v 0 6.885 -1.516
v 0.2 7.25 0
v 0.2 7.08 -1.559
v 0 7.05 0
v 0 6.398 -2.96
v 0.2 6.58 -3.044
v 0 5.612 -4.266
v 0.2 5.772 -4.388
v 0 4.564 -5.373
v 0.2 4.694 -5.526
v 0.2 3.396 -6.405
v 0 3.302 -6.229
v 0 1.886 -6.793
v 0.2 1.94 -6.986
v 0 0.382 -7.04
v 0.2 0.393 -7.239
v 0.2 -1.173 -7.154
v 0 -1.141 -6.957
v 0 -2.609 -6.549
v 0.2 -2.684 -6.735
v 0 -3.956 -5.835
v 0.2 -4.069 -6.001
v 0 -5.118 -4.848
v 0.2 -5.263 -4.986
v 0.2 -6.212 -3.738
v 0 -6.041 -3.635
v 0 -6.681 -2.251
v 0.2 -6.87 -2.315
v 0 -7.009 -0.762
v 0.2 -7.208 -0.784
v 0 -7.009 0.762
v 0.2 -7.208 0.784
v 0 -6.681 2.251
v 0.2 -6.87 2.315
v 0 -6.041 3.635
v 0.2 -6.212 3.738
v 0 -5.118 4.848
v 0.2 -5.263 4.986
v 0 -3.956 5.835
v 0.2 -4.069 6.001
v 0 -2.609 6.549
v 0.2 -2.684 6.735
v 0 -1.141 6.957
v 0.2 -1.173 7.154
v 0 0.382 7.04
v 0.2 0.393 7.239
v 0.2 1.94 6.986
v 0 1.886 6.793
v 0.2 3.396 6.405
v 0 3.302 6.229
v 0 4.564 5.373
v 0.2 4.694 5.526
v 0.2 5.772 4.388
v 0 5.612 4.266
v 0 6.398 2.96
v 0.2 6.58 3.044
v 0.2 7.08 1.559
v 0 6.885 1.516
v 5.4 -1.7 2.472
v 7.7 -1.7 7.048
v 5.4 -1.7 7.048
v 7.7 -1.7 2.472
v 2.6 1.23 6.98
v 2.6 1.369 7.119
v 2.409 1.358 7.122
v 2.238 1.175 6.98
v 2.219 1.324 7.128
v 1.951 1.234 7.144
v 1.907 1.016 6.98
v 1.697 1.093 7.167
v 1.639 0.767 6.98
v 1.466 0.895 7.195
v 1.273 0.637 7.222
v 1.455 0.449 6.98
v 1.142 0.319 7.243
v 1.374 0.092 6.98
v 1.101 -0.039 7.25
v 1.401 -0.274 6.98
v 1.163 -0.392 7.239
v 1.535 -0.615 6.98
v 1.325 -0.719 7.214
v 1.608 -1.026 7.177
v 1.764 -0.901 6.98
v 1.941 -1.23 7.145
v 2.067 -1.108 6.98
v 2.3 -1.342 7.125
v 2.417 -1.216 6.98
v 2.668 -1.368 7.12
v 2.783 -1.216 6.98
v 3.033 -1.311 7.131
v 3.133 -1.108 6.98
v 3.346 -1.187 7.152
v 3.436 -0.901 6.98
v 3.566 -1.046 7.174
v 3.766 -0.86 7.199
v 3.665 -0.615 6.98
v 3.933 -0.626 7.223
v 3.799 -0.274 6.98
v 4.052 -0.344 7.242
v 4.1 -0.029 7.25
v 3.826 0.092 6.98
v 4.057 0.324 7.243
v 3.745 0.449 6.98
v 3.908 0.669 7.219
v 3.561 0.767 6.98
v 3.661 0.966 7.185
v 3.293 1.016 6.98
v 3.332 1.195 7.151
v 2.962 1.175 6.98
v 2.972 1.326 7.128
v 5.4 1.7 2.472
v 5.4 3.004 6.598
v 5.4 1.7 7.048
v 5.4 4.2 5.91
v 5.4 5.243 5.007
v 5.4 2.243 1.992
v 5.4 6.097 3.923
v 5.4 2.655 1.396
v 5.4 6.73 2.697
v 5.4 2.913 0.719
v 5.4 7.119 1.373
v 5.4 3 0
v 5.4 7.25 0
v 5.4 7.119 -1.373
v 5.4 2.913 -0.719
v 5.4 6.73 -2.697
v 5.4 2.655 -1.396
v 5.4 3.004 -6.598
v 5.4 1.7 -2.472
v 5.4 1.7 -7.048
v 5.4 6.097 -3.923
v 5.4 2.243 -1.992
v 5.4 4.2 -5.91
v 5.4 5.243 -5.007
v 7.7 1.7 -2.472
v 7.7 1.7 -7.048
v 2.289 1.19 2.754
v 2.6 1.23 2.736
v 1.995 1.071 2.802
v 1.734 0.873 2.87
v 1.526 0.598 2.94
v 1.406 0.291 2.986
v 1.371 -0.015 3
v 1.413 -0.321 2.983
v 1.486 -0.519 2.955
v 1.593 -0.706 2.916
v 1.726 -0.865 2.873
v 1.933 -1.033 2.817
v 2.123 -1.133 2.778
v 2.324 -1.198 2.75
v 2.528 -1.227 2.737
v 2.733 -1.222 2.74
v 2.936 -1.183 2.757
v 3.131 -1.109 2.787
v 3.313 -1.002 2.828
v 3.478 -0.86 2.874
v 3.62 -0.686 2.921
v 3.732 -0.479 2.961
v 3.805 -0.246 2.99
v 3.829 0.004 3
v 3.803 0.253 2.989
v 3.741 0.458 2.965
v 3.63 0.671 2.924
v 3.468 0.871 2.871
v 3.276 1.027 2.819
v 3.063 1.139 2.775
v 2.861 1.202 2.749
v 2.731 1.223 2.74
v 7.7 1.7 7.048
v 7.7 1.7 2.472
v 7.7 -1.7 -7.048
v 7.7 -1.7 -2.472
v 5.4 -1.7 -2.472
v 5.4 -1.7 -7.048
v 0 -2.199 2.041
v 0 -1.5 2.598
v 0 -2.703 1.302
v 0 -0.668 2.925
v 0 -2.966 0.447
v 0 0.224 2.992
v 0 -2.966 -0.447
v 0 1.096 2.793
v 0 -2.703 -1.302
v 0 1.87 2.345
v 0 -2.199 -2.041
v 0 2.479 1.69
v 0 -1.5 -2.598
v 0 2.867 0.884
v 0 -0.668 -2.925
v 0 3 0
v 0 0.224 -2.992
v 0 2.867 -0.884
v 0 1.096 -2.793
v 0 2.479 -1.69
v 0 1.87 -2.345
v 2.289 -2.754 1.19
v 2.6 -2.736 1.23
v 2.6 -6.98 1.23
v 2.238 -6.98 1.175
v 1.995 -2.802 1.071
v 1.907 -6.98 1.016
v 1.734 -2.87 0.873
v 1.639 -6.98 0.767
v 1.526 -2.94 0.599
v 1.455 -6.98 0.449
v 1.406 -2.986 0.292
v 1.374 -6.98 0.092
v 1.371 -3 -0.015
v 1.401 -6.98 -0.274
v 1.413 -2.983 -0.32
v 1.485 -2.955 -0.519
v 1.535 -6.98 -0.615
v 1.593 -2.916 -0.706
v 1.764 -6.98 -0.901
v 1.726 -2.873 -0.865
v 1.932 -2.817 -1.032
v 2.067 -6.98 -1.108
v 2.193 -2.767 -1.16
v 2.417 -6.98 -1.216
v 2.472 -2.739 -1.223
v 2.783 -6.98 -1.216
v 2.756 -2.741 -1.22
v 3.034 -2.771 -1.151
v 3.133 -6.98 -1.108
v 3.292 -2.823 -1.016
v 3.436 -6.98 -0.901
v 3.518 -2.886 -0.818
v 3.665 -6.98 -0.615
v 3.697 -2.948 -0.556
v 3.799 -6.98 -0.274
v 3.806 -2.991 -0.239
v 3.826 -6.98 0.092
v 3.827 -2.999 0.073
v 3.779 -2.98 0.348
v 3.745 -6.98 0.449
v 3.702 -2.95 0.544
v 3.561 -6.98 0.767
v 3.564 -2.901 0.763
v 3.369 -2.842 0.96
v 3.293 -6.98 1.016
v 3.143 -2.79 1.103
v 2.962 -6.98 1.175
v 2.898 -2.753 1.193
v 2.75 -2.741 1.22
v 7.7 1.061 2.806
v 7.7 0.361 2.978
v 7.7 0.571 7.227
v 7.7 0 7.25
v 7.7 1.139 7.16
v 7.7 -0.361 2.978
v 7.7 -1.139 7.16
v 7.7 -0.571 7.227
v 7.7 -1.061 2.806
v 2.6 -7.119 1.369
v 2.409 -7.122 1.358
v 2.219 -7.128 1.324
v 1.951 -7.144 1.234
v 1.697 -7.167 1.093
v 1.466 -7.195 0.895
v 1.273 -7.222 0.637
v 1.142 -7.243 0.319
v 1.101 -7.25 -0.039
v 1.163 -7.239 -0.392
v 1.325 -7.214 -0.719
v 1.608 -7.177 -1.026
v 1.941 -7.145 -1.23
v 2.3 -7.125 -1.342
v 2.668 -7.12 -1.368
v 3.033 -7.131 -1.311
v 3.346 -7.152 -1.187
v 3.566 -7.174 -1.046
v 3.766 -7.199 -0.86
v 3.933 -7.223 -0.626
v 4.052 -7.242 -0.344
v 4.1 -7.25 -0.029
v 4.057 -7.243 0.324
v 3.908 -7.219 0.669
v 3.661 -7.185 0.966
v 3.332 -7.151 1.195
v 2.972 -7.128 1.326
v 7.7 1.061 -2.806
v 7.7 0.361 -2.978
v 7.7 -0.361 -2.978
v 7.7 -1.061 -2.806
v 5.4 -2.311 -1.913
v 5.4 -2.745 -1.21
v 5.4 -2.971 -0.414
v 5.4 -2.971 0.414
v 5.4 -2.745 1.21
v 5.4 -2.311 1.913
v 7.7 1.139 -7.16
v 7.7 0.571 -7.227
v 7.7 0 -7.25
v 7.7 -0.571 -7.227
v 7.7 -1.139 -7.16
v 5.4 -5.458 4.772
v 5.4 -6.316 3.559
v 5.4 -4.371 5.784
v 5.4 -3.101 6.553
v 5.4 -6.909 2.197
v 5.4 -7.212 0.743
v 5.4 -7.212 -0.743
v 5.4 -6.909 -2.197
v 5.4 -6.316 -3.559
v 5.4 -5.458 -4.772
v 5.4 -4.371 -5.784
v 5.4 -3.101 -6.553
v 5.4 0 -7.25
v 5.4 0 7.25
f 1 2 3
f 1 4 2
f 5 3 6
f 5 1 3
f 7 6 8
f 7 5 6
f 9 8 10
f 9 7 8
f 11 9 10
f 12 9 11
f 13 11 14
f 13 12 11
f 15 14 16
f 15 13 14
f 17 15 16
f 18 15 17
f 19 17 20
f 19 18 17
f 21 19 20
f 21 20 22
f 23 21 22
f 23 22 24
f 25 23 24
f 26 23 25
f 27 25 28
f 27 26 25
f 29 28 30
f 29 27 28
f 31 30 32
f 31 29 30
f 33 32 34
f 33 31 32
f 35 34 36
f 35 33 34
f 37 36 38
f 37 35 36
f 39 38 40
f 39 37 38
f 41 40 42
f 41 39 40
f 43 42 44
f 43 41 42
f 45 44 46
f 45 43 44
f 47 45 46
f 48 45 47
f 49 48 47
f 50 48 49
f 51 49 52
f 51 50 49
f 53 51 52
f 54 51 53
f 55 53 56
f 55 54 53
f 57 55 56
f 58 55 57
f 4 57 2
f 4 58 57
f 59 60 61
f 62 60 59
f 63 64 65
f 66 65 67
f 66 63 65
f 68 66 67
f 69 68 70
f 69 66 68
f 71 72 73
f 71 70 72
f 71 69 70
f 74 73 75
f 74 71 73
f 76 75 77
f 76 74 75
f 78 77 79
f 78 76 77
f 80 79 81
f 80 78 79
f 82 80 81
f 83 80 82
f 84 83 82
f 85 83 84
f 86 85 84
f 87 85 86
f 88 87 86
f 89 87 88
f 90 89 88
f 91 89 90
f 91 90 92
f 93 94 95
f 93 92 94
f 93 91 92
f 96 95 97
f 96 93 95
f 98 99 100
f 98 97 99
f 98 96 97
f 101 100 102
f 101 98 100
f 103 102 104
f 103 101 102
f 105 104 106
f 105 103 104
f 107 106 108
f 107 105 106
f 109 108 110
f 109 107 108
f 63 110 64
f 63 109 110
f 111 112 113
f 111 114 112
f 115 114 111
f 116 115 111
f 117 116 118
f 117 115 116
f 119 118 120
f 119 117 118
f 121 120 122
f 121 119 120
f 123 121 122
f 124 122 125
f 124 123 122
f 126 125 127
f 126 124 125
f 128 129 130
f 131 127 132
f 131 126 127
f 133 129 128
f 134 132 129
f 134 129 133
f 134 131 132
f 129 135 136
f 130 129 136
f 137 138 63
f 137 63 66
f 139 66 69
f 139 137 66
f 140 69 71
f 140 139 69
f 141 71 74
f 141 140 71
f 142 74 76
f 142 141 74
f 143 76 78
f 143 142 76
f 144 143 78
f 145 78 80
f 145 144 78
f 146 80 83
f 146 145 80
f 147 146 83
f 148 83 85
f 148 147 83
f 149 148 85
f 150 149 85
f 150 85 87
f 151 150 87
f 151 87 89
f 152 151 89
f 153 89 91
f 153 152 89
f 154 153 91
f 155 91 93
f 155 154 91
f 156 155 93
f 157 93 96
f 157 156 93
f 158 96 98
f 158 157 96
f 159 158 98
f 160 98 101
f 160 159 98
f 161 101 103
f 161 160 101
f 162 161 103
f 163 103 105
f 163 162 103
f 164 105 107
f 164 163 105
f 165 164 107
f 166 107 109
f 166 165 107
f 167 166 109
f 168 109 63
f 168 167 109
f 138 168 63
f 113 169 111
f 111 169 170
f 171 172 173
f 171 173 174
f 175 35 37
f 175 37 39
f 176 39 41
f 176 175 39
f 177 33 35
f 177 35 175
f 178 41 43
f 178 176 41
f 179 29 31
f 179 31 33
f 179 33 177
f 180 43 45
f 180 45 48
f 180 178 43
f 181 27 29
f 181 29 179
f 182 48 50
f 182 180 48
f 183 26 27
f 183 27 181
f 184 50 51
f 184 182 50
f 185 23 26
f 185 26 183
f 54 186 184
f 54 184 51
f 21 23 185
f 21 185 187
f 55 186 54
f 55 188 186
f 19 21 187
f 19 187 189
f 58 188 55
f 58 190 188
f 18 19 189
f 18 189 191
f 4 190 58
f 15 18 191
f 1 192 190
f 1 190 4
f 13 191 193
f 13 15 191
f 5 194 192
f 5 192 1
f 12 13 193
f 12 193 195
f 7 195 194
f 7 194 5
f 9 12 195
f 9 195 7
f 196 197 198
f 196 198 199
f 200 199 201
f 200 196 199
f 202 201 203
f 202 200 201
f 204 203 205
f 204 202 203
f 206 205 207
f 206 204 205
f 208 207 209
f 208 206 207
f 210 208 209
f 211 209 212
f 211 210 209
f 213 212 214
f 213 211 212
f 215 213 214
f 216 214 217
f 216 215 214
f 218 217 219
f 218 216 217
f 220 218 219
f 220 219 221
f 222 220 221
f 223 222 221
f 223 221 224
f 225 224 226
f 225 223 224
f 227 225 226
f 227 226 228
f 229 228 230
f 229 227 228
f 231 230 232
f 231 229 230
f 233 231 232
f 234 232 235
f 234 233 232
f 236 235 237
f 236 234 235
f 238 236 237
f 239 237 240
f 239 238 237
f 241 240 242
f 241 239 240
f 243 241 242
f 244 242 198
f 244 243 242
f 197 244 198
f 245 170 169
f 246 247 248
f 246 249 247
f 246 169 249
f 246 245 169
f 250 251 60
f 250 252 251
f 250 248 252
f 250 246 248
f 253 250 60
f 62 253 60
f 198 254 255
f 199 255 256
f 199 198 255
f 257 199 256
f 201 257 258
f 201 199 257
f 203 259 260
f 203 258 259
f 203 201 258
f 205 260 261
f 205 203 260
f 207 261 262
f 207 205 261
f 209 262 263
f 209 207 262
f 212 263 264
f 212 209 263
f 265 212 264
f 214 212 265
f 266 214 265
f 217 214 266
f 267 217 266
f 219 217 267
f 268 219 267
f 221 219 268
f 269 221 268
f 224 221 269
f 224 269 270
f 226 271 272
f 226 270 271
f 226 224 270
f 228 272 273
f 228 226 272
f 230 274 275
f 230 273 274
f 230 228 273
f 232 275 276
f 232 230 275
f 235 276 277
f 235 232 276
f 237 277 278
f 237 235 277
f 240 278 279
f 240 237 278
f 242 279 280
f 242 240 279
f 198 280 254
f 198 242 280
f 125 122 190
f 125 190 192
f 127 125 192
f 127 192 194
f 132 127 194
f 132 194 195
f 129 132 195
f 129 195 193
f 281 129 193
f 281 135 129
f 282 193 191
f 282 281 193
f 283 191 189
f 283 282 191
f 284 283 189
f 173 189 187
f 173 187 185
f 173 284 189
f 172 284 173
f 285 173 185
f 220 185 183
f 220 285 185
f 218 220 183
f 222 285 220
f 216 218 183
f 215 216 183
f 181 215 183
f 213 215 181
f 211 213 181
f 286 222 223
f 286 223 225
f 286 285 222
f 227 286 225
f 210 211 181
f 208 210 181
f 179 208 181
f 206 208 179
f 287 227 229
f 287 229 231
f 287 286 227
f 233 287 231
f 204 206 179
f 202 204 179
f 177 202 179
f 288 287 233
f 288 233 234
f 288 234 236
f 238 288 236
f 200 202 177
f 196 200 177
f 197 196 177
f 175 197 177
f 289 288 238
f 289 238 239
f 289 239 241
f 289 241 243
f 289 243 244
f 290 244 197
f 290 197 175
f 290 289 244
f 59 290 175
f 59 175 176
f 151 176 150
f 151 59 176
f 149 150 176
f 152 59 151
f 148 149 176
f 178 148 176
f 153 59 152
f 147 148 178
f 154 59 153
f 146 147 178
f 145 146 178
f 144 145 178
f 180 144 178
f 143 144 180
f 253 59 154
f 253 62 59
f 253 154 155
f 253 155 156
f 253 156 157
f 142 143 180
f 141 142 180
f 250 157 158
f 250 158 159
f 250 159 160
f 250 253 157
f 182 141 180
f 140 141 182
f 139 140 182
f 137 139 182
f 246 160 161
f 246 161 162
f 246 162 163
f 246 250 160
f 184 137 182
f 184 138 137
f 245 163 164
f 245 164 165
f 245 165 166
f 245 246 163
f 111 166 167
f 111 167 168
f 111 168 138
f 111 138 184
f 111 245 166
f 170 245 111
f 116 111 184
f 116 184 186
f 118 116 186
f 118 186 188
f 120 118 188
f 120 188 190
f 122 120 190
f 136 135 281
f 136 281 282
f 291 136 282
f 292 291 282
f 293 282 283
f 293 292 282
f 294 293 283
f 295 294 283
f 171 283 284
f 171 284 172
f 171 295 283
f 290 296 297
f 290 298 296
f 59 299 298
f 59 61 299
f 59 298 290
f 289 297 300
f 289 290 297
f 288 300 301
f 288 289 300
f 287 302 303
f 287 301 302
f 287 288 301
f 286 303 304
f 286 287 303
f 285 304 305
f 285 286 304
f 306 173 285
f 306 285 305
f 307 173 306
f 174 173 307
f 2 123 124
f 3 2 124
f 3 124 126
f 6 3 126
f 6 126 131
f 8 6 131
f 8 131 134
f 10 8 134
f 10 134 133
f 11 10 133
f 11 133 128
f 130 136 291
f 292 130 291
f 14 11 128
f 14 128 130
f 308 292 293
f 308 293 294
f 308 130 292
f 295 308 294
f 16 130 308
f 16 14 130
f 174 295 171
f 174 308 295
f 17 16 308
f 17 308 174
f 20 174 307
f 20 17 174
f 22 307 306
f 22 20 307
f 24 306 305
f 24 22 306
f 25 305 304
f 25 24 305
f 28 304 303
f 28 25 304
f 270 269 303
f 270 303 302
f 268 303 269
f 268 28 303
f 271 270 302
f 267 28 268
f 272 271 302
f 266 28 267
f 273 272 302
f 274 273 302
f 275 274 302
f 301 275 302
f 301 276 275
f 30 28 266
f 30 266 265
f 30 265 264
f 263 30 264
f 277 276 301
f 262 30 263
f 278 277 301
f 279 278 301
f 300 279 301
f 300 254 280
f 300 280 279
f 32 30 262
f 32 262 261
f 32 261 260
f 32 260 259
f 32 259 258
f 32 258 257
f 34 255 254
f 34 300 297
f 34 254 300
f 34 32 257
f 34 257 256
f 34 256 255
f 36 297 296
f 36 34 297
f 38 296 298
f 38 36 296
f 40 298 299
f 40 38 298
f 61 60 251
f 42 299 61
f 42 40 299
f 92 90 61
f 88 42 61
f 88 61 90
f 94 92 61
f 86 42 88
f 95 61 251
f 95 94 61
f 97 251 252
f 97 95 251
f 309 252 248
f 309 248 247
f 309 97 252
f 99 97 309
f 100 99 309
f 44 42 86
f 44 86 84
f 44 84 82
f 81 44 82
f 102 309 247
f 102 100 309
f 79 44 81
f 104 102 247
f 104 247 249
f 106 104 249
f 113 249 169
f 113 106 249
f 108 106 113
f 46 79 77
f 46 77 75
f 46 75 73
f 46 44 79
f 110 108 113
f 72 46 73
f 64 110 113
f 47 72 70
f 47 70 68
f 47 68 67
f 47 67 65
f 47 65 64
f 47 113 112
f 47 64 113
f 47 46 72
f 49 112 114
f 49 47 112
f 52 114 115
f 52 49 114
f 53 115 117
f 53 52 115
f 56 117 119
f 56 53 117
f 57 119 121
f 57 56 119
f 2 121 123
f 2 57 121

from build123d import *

# Parameters (mm, degrees)
SKETCH2_W          = 16.5
SKETCH2_H          = 15.5
SKETCH2_W_2        = 14.5
SKETCH2_H_2        = 3.4
CUT_EXTRUDE1_DEPTH = 2.3


with BuildPart() as part:
    # Sketch1 → Revolve1 (revolve)
    with BuildSketch(Plane.XY):
        Polygon((0, 7.05), (0, 3), (7.7, 3), (7.7, 7.25), (0.2, 7.25), align=None)
    revolve(axis=Axis((7.7, 0, 0), (-1, 0, 0)))

    # Sketch2 → Cut-Extrude1 (cut)
    with BuildSketch(Plane(origin=(7.7, 0, 0), x_dir=(0, 0, -1), z_dir=(1, 0, 0))):
        Rectangle(SKETCH2_W, SKETCH2_H)
        Rectangle(SKETCH2_W_2, SKETCH2_H_2, mode=Mode.SUBTRACT)
    extrude(amount=-CUT_EXTRUDE1_DEPTH, mode=Mode.SUBTRACT)

    # Sketch3 → Cut-Revolve1 (revolve, cut)
    with BuildSketch(Plane(origin=(2.6, 0, 0), x_dir=(0, 0, -1), z_dir=(1, 0, 0))):
        Polygon((-7.25, 0), (-7.25, 1.5), (-6.9795, 1.2295), (0, 1.2295), (0, 0), align=None)
    revolve(axis=Axis((2.6, 0, 0), (0, 0, 1)), mode=Mode.SUBTRACT)

    # Sketch4 → Cut-Revolve2 (revolve, cut)
    with BuildSketch(Plane(origin=(2.6, 0, 0), x_dir=(0, 0, -1), z_dir=(1, 0, 0))):
        Polygon((0, -7.25), (-1.5, -7.25), (-1.2295, -6.9795), (-1.2295, 0), (0, 0), align=None)
    revolve(axis=Axis((2.6, 0, 0), (0, -1, 0)), mode=Mode.SUBTRACT)


solid = part.part
